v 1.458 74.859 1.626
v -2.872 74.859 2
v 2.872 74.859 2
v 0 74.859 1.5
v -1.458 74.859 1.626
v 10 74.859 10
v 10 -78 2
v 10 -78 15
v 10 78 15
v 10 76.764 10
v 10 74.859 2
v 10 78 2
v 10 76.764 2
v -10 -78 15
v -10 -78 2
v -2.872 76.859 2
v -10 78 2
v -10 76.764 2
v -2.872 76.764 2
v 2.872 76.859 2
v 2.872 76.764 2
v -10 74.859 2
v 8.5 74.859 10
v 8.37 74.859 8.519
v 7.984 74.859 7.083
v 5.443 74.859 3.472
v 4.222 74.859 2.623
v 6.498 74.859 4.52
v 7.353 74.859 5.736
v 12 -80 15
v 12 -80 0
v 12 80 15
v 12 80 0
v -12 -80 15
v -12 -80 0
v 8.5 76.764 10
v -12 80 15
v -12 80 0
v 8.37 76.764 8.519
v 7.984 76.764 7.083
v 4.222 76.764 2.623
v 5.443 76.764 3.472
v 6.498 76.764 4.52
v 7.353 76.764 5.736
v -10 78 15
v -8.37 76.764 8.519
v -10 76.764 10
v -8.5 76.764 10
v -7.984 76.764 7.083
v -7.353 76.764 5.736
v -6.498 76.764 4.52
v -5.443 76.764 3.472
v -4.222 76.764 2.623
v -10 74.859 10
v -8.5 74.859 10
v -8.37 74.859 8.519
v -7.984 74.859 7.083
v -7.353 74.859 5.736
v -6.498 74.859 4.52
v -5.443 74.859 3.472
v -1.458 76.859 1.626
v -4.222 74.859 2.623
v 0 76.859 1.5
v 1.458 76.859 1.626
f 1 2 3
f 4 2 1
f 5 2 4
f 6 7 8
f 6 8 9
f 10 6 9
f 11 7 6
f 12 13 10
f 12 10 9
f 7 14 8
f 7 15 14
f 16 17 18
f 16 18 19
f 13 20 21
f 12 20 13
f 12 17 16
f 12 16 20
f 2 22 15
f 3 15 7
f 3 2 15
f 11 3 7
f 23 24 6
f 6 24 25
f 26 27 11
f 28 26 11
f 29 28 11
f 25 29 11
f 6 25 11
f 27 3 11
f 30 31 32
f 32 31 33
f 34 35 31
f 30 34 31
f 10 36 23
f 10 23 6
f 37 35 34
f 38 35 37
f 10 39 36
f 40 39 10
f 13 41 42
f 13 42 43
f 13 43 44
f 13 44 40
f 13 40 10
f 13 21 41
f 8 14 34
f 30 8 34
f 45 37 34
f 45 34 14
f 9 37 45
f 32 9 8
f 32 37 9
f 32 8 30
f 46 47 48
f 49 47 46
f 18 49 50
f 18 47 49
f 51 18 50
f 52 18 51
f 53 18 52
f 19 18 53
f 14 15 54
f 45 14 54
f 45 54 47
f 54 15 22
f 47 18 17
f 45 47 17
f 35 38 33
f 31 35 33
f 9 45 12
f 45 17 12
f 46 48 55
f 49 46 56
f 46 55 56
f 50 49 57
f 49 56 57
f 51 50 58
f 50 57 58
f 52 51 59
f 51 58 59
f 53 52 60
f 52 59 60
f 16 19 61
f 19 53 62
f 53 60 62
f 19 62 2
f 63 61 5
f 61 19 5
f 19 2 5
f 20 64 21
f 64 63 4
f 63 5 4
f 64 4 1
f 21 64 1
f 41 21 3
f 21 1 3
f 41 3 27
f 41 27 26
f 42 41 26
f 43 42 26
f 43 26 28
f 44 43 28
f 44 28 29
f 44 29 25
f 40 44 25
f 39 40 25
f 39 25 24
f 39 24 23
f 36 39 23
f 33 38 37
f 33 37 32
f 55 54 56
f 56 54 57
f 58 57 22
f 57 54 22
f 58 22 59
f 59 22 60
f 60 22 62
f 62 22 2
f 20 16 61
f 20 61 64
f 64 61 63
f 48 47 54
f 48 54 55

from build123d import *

# Parameters (mm, degrees)
F0_W     = 24
F0_H     = 160
F1_DEPTH = 15
F2_T     = -2
F3_W     = 20
F3_H     = 1.90571
F4_DEPTH = 8
F5_R     = 8.5
F6_DEPTH = 2


with BuildPart() as f1:
    # F0 (on Top) → F1 (new body)
    with BuildSketch(Plane.XY):
        Rectangle(F0_W, F0_H)
    extrude(amount=F1_DEPTH)

    # F2
    f2_openings = [f1.faces().sort_by_distance(p)[0] for p in [
        (0, 0, 15),
    ]]
    offset(amount=F2_T, openings=f2_openings)

    # F3 (on face) → F4 (join)
    with BuildSketch(Plane.XY.offset(2)):
        with Locations((0, 75.811416)):
            Rectangle(F3_W, F3_H)
    extrude(amount=F4_DEPTH)

    # F5 (on face) → F6 (cut)
    with BuildSketch(Plane.XZ.offset(-74.858561)):
        with Locations((0, 10)):
            Circle(F5_R)
    extrude(amount=-F6_DEPTH, mode=Mode.SUBTRACT)


solid = f1.part
